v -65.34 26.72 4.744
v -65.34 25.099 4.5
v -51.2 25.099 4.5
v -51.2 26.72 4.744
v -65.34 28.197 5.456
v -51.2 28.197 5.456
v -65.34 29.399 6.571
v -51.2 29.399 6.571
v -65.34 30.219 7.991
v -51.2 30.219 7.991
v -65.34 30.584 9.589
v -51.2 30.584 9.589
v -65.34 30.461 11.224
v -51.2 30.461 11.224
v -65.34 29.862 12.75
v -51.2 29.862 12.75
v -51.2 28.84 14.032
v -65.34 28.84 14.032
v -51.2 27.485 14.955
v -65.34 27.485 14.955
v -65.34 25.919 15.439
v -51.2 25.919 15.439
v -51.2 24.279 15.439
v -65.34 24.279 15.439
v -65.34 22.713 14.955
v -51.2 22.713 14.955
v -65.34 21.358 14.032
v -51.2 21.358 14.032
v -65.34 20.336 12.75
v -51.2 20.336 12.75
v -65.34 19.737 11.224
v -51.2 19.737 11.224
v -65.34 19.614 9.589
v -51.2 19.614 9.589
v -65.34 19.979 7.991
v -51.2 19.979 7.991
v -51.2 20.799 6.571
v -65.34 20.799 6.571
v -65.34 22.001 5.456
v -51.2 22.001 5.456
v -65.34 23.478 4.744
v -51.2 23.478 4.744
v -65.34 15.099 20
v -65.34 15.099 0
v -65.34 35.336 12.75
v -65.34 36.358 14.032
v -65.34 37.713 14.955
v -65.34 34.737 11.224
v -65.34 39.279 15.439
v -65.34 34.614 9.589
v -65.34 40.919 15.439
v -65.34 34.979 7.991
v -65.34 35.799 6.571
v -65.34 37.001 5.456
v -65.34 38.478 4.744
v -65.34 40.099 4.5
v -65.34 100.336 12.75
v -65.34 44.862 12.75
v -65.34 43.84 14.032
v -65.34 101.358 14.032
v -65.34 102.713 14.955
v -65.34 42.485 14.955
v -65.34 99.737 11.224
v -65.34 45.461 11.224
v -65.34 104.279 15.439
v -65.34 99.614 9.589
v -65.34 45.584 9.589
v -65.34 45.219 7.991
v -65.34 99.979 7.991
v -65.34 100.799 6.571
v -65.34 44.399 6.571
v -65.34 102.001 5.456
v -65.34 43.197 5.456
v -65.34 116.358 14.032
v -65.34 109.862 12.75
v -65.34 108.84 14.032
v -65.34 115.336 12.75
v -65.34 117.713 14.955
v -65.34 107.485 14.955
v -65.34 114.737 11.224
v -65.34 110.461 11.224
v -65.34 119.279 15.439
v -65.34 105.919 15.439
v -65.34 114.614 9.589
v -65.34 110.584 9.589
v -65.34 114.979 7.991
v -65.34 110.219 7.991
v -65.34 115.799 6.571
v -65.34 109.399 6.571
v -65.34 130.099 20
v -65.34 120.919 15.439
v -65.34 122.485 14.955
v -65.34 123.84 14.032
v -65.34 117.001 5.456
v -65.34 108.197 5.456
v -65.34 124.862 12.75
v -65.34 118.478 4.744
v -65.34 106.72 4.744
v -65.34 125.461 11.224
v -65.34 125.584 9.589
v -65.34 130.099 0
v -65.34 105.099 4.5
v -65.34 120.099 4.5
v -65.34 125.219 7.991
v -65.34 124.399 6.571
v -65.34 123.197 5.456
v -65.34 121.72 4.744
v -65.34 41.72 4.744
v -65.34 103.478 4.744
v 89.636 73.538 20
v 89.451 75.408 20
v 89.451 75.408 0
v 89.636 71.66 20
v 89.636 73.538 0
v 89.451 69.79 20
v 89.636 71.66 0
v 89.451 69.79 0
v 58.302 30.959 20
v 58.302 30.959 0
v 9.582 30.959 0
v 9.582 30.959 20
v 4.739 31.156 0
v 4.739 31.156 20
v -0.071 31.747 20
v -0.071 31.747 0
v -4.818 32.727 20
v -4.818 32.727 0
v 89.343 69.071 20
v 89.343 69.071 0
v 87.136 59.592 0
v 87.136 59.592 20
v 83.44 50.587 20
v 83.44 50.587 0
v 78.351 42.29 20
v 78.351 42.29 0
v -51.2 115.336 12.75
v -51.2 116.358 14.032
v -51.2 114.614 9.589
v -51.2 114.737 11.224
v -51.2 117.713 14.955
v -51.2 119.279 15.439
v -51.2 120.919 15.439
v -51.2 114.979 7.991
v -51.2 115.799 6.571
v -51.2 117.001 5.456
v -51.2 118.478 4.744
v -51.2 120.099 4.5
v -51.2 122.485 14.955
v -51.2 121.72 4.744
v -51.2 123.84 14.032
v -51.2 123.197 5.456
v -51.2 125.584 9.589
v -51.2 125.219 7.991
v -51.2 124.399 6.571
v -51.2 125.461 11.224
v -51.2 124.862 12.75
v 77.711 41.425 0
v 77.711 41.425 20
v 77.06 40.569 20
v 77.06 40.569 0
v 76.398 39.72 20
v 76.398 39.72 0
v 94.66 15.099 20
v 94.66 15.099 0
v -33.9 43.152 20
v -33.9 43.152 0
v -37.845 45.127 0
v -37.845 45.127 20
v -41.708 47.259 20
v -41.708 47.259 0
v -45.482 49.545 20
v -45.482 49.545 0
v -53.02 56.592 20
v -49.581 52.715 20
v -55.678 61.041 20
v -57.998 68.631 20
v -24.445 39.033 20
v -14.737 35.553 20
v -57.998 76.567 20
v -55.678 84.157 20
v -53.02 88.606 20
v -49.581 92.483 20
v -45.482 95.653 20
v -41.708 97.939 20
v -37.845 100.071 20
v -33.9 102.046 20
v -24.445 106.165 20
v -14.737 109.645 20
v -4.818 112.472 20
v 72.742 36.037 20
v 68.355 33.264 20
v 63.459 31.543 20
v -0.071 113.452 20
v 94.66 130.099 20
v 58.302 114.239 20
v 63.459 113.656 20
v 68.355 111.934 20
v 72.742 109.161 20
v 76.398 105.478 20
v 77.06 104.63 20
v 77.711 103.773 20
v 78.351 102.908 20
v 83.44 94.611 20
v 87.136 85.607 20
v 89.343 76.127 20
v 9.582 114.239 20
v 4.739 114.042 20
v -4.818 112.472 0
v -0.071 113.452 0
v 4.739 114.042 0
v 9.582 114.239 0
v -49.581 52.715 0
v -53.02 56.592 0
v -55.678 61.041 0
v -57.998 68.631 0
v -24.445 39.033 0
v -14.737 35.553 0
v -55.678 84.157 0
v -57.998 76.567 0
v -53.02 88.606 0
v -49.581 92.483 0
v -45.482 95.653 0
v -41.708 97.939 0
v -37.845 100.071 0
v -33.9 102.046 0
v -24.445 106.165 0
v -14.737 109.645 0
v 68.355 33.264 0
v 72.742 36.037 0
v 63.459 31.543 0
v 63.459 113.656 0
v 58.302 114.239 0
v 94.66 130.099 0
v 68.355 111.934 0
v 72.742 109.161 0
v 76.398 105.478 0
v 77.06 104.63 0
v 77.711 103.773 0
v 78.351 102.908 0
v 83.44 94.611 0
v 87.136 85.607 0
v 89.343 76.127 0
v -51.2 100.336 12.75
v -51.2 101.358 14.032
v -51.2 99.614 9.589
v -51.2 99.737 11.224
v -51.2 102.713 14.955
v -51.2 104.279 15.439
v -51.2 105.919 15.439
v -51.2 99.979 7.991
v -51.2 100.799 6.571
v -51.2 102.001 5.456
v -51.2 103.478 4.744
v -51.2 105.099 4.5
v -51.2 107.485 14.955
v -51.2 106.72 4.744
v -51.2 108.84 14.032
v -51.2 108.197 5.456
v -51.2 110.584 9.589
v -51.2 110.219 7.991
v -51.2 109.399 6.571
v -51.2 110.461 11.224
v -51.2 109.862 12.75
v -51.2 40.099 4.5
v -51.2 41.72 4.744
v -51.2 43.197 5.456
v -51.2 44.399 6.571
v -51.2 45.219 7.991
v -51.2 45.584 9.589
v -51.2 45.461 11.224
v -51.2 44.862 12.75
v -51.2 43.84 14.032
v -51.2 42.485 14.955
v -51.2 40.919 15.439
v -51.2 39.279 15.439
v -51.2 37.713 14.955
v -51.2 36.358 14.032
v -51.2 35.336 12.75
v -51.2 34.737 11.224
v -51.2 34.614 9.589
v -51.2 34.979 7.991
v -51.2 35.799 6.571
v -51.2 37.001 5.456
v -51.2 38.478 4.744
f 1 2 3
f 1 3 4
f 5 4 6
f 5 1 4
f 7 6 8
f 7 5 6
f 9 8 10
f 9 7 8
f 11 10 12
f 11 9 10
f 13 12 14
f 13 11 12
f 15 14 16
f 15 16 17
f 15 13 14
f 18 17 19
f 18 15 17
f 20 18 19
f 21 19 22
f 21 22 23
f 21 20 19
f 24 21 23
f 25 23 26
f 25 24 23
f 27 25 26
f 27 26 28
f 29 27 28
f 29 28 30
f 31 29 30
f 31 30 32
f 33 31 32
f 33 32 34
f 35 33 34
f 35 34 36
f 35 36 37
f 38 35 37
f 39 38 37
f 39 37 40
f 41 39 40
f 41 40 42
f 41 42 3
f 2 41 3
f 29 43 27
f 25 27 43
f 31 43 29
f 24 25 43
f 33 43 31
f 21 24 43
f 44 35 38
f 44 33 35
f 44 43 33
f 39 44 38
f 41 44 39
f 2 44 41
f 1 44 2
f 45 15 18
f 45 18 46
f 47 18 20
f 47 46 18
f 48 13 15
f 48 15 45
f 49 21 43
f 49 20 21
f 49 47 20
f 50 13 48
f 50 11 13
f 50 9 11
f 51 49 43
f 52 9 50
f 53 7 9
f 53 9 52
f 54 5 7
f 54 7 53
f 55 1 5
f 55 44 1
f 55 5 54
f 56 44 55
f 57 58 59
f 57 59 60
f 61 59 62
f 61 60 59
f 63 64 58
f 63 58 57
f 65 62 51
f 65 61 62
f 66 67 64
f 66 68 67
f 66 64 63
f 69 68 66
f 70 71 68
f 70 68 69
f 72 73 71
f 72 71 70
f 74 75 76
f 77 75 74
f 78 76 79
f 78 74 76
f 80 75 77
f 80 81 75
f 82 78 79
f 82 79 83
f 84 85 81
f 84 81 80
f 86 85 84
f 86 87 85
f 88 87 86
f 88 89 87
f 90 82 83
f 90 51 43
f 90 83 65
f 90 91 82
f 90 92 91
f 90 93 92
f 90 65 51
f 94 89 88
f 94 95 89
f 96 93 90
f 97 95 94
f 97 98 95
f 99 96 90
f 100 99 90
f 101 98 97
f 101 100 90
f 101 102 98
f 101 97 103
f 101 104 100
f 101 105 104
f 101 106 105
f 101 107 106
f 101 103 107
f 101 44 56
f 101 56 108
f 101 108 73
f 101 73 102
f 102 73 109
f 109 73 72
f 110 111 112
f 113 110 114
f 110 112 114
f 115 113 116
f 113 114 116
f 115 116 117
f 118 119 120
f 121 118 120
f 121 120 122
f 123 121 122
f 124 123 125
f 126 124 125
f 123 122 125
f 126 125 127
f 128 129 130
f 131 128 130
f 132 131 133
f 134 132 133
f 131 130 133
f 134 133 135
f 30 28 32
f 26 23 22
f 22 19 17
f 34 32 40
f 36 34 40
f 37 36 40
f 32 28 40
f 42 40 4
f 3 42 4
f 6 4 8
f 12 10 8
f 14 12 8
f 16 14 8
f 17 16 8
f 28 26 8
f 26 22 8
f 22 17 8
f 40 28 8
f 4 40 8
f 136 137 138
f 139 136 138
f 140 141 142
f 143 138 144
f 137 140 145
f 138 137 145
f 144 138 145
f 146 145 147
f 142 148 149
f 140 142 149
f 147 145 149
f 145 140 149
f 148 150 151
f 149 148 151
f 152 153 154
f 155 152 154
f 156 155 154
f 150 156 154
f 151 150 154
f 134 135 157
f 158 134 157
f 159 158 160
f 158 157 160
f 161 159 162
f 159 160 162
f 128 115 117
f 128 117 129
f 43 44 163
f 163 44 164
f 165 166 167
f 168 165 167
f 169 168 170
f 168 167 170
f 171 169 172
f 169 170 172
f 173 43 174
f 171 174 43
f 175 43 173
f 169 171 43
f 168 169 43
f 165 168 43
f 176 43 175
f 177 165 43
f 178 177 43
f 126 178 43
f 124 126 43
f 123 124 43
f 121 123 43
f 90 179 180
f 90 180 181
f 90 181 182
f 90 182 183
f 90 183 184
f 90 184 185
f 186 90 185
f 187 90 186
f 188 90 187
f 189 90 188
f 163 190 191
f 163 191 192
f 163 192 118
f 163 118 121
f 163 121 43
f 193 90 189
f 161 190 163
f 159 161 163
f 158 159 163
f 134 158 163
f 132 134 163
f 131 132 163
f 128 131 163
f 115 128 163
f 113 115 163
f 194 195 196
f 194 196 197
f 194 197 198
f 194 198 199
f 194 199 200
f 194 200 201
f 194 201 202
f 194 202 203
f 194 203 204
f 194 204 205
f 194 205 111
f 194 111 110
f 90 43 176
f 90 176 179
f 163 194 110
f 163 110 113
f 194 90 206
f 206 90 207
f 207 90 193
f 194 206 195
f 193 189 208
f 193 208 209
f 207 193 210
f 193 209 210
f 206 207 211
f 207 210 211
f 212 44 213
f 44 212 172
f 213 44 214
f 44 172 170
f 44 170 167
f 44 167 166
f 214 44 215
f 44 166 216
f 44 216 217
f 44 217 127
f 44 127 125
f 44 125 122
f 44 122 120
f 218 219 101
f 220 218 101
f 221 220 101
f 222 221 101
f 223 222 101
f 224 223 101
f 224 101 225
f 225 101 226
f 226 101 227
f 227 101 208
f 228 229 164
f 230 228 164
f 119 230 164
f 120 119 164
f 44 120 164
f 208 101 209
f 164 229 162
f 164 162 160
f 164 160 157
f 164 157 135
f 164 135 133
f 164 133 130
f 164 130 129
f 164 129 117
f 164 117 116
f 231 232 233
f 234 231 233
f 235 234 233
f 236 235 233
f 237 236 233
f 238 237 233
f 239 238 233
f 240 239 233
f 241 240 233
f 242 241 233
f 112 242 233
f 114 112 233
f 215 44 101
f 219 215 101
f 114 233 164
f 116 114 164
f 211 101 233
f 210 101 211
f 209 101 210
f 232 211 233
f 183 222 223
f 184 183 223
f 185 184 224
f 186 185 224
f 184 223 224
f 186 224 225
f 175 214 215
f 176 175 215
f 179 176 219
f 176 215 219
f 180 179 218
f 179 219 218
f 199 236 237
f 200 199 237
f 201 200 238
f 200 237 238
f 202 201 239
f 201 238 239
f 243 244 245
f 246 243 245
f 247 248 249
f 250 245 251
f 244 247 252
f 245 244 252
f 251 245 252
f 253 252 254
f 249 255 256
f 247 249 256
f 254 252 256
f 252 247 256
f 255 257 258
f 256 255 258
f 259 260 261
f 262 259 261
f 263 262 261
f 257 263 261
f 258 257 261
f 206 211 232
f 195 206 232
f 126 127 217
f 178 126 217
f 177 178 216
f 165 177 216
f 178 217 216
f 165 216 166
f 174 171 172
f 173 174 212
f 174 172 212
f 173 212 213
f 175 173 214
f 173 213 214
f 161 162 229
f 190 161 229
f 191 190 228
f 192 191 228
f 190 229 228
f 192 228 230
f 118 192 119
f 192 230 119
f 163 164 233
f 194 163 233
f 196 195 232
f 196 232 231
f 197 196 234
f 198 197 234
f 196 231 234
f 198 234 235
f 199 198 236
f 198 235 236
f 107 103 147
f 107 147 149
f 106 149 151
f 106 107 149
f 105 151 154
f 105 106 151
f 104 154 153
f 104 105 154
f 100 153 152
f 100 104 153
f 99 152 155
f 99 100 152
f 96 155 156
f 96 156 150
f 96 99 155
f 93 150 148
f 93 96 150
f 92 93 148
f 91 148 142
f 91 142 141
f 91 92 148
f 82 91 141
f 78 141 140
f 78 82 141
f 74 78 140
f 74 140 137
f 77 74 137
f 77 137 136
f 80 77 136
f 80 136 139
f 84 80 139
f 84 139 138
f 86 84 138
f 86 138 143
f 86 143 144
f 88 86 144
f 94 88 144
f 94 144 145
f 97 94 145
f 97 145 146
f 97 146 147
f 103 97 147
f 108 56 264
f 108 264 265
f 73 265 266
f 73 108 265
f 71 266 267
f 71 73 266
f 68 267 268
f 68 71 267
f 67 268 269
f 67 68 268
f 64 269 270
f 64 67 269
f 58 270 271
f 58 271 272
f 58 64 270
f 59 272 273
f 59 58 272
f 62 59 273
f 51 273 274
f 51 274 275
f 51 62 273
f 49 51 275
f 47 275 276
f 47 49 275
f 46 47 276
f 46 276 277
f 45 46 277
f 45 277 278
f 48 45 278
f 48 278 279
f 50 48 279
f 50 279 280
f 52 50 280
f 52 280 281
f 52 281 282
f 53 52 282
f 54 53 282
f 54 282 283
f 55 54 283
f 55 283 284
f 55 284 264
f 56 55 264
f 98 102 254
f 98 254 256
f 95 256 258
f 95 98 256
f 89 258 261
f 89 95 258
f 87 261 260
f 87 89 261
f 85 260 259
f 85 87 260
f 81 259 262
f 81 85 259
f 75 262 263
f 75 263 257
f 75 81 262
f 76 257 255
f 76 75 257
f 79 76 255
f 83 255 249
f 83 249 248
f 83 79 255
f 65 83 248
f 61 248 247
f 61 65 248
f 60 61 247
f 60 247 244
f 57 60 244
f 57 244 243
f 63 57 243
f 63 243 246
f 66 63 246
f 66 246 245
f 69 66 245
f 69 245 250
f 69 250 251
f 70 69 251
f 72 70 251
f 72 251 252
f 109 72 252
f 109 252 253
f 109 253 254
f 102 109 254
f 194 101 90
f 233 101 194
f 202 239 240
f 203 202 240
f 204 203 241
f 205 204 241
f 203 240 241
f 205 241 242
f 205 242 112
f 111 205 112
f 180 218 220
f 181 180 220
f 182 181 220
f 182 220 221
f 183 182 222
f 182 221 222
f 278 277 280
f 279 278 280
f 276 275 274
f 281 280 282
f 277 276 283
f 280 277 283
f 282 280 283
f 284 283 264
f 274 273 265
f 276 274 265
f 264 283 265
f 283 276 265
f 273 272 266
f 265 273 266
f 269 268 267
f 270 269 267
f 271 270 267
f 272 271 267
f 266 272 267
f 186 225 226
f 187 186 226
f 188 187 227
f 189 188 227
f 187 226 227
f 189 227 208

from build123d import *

# Parameters (mm, degrees)
SKETCH_4_W          = 160
SKETCH_4_H          = 115
EXTRUDE_1_DEPTH     = 20
CUT_EXTRUDE_1_DEPTH = 20
SKETCH_16_R         = 5.5
CUT_EXTRUDE_2_DEPTH = 15


with BuildPart() as part:
    # 草圖4 → 填料-伸長1 (new body)
    with BuildSketch(Plane.XY):
        with Locations((14.659712787, 72.59909222)):
            Rectangle(SKETCH_4_W, SKETCH_4_H)
    extrude(amount=EXTRUDE_1_DEPTH)

    # 草圖2 → 除料-伸長1 (cut)
    with BuildSketch(Plane.XY):
        with BuildLine():
            Line((9.582154386, 114.239387395), (32.639572719, 114.239387395))
            Line((32.639572719, 114.239387395), (35.911975242, 114.239387395))
            Line((35.911975242, 114.239387395), (58.302252446, 114.239387395))
            ThreePointArc((58.302252446, 114.239387395), (68.354977159, 111.933757574), (76.3981894, 105.477757274))
            ThreePointArc((76.3981894, 105.477757274), (77.386875553, 104.202213525), (78.350890948, 102.907923572))
            ThreePointArc((78.350890948, 102.907923572), (85.469179447, 90.183153699), (89.343429579, 76.126838912))
            Line((89.343429579, 76.126838912), (89.450916797, 75.407862922))
            ThreePointArc((89.450916797, 75.407862922), (89.659712787, 72.59909222), (89.450916797, 69.790321519))
            Line((89.450916797, 69.790321519), (89.343429579, 69.071345528))
            ThreePointArc((89.343429579, 69.071345528), (85.469179447, 55.015030741), (78.350890948, 42.290260868))
            ThreePointArc((78.350890948, 42.290260868), (77.386875553, 40.995970915), (76.3981894, 39.720427166))
            ThreePointArc((76.3981894, 39.720427166), (68.354977159, 33.264426866), (58.302252446, 30.958797045))
            Line((58.302252446, 30.958797045), (35.911975242, 30.958797045))
            Line((35.911975242, 30.958797045), (32.639572719, 30.958797045))
            Line((32.639572719, 30.958797045), (9.582154386, 30.958797045))
            ThreePointArc((9.582154386, 30.958797045), (2.328045496, 31.402381927), (-4.817967678, 32.726526576))
            ThreePointArc((-4.817967678, 32.726526576), (-19.619782039, 37.212171907), (-33.900352311, 43.151871824))
            ThreePointArc((-33.900352311, 43.151871824), (-39.787433986, 46.173940455), (-45.481740166, 49.545217155))
            ThreePointArc((-45.481740166, 49.545217155), (-51.391366265, 54.573313812), (-55.677619443, 61.041193705))
            ThreePointArc((-55.677619443, 61.041193705), (-58.292337425, 72.59909222), (-55.677619443, 84.156990735))
            ThreePointArc((-55.677619443, 84.156990735), (-51.391366265, 90.624870628), (-45.481740166, 95.652967285))
            ThreePointArc((-45.481740166, 95.652967285), (-39.787433986, 99.024243985), (-33.900352311, 102.046312617))
            ThreePointArc((-33.900352311, 102.046312617), (-19.619782039, 107.986012534), (-4.817967678, 112.471657865))
            ThreePointArc((-4.817967678, 112.471657865), (2.328045496, 113.795802514), (9.582154386, 114.239387395))
        make_face()
    extrude(amount=CUT_EXTRUDE_1_DEPTH, mode=Mode.SUBTRACT)

    # 草圖16 → 除料-伸長2 (cut)
    with BuildSketch(Plane(origin=(-66.2, 0, 0), x_dir=(0, 0, -1), z_dir=(1, 0, 0))):
        with Locations((-10, 120.09909222)):
            Circle(SKETCH_16_R)
        with Locations((-10, 105.09909222)):
            Circle(SKETCH_16_R)
        with Locations((-10, 40.09909222)):
            Circle(SKETCH_16_R)
        with Locations((-10, 25.09909222)):
            Circle(SKETCH_16_R)
    extrude(amount=CUT_EXTRUDE_2_DEPTH, mode=Mode.SUBTRACT)


solid = part.part
